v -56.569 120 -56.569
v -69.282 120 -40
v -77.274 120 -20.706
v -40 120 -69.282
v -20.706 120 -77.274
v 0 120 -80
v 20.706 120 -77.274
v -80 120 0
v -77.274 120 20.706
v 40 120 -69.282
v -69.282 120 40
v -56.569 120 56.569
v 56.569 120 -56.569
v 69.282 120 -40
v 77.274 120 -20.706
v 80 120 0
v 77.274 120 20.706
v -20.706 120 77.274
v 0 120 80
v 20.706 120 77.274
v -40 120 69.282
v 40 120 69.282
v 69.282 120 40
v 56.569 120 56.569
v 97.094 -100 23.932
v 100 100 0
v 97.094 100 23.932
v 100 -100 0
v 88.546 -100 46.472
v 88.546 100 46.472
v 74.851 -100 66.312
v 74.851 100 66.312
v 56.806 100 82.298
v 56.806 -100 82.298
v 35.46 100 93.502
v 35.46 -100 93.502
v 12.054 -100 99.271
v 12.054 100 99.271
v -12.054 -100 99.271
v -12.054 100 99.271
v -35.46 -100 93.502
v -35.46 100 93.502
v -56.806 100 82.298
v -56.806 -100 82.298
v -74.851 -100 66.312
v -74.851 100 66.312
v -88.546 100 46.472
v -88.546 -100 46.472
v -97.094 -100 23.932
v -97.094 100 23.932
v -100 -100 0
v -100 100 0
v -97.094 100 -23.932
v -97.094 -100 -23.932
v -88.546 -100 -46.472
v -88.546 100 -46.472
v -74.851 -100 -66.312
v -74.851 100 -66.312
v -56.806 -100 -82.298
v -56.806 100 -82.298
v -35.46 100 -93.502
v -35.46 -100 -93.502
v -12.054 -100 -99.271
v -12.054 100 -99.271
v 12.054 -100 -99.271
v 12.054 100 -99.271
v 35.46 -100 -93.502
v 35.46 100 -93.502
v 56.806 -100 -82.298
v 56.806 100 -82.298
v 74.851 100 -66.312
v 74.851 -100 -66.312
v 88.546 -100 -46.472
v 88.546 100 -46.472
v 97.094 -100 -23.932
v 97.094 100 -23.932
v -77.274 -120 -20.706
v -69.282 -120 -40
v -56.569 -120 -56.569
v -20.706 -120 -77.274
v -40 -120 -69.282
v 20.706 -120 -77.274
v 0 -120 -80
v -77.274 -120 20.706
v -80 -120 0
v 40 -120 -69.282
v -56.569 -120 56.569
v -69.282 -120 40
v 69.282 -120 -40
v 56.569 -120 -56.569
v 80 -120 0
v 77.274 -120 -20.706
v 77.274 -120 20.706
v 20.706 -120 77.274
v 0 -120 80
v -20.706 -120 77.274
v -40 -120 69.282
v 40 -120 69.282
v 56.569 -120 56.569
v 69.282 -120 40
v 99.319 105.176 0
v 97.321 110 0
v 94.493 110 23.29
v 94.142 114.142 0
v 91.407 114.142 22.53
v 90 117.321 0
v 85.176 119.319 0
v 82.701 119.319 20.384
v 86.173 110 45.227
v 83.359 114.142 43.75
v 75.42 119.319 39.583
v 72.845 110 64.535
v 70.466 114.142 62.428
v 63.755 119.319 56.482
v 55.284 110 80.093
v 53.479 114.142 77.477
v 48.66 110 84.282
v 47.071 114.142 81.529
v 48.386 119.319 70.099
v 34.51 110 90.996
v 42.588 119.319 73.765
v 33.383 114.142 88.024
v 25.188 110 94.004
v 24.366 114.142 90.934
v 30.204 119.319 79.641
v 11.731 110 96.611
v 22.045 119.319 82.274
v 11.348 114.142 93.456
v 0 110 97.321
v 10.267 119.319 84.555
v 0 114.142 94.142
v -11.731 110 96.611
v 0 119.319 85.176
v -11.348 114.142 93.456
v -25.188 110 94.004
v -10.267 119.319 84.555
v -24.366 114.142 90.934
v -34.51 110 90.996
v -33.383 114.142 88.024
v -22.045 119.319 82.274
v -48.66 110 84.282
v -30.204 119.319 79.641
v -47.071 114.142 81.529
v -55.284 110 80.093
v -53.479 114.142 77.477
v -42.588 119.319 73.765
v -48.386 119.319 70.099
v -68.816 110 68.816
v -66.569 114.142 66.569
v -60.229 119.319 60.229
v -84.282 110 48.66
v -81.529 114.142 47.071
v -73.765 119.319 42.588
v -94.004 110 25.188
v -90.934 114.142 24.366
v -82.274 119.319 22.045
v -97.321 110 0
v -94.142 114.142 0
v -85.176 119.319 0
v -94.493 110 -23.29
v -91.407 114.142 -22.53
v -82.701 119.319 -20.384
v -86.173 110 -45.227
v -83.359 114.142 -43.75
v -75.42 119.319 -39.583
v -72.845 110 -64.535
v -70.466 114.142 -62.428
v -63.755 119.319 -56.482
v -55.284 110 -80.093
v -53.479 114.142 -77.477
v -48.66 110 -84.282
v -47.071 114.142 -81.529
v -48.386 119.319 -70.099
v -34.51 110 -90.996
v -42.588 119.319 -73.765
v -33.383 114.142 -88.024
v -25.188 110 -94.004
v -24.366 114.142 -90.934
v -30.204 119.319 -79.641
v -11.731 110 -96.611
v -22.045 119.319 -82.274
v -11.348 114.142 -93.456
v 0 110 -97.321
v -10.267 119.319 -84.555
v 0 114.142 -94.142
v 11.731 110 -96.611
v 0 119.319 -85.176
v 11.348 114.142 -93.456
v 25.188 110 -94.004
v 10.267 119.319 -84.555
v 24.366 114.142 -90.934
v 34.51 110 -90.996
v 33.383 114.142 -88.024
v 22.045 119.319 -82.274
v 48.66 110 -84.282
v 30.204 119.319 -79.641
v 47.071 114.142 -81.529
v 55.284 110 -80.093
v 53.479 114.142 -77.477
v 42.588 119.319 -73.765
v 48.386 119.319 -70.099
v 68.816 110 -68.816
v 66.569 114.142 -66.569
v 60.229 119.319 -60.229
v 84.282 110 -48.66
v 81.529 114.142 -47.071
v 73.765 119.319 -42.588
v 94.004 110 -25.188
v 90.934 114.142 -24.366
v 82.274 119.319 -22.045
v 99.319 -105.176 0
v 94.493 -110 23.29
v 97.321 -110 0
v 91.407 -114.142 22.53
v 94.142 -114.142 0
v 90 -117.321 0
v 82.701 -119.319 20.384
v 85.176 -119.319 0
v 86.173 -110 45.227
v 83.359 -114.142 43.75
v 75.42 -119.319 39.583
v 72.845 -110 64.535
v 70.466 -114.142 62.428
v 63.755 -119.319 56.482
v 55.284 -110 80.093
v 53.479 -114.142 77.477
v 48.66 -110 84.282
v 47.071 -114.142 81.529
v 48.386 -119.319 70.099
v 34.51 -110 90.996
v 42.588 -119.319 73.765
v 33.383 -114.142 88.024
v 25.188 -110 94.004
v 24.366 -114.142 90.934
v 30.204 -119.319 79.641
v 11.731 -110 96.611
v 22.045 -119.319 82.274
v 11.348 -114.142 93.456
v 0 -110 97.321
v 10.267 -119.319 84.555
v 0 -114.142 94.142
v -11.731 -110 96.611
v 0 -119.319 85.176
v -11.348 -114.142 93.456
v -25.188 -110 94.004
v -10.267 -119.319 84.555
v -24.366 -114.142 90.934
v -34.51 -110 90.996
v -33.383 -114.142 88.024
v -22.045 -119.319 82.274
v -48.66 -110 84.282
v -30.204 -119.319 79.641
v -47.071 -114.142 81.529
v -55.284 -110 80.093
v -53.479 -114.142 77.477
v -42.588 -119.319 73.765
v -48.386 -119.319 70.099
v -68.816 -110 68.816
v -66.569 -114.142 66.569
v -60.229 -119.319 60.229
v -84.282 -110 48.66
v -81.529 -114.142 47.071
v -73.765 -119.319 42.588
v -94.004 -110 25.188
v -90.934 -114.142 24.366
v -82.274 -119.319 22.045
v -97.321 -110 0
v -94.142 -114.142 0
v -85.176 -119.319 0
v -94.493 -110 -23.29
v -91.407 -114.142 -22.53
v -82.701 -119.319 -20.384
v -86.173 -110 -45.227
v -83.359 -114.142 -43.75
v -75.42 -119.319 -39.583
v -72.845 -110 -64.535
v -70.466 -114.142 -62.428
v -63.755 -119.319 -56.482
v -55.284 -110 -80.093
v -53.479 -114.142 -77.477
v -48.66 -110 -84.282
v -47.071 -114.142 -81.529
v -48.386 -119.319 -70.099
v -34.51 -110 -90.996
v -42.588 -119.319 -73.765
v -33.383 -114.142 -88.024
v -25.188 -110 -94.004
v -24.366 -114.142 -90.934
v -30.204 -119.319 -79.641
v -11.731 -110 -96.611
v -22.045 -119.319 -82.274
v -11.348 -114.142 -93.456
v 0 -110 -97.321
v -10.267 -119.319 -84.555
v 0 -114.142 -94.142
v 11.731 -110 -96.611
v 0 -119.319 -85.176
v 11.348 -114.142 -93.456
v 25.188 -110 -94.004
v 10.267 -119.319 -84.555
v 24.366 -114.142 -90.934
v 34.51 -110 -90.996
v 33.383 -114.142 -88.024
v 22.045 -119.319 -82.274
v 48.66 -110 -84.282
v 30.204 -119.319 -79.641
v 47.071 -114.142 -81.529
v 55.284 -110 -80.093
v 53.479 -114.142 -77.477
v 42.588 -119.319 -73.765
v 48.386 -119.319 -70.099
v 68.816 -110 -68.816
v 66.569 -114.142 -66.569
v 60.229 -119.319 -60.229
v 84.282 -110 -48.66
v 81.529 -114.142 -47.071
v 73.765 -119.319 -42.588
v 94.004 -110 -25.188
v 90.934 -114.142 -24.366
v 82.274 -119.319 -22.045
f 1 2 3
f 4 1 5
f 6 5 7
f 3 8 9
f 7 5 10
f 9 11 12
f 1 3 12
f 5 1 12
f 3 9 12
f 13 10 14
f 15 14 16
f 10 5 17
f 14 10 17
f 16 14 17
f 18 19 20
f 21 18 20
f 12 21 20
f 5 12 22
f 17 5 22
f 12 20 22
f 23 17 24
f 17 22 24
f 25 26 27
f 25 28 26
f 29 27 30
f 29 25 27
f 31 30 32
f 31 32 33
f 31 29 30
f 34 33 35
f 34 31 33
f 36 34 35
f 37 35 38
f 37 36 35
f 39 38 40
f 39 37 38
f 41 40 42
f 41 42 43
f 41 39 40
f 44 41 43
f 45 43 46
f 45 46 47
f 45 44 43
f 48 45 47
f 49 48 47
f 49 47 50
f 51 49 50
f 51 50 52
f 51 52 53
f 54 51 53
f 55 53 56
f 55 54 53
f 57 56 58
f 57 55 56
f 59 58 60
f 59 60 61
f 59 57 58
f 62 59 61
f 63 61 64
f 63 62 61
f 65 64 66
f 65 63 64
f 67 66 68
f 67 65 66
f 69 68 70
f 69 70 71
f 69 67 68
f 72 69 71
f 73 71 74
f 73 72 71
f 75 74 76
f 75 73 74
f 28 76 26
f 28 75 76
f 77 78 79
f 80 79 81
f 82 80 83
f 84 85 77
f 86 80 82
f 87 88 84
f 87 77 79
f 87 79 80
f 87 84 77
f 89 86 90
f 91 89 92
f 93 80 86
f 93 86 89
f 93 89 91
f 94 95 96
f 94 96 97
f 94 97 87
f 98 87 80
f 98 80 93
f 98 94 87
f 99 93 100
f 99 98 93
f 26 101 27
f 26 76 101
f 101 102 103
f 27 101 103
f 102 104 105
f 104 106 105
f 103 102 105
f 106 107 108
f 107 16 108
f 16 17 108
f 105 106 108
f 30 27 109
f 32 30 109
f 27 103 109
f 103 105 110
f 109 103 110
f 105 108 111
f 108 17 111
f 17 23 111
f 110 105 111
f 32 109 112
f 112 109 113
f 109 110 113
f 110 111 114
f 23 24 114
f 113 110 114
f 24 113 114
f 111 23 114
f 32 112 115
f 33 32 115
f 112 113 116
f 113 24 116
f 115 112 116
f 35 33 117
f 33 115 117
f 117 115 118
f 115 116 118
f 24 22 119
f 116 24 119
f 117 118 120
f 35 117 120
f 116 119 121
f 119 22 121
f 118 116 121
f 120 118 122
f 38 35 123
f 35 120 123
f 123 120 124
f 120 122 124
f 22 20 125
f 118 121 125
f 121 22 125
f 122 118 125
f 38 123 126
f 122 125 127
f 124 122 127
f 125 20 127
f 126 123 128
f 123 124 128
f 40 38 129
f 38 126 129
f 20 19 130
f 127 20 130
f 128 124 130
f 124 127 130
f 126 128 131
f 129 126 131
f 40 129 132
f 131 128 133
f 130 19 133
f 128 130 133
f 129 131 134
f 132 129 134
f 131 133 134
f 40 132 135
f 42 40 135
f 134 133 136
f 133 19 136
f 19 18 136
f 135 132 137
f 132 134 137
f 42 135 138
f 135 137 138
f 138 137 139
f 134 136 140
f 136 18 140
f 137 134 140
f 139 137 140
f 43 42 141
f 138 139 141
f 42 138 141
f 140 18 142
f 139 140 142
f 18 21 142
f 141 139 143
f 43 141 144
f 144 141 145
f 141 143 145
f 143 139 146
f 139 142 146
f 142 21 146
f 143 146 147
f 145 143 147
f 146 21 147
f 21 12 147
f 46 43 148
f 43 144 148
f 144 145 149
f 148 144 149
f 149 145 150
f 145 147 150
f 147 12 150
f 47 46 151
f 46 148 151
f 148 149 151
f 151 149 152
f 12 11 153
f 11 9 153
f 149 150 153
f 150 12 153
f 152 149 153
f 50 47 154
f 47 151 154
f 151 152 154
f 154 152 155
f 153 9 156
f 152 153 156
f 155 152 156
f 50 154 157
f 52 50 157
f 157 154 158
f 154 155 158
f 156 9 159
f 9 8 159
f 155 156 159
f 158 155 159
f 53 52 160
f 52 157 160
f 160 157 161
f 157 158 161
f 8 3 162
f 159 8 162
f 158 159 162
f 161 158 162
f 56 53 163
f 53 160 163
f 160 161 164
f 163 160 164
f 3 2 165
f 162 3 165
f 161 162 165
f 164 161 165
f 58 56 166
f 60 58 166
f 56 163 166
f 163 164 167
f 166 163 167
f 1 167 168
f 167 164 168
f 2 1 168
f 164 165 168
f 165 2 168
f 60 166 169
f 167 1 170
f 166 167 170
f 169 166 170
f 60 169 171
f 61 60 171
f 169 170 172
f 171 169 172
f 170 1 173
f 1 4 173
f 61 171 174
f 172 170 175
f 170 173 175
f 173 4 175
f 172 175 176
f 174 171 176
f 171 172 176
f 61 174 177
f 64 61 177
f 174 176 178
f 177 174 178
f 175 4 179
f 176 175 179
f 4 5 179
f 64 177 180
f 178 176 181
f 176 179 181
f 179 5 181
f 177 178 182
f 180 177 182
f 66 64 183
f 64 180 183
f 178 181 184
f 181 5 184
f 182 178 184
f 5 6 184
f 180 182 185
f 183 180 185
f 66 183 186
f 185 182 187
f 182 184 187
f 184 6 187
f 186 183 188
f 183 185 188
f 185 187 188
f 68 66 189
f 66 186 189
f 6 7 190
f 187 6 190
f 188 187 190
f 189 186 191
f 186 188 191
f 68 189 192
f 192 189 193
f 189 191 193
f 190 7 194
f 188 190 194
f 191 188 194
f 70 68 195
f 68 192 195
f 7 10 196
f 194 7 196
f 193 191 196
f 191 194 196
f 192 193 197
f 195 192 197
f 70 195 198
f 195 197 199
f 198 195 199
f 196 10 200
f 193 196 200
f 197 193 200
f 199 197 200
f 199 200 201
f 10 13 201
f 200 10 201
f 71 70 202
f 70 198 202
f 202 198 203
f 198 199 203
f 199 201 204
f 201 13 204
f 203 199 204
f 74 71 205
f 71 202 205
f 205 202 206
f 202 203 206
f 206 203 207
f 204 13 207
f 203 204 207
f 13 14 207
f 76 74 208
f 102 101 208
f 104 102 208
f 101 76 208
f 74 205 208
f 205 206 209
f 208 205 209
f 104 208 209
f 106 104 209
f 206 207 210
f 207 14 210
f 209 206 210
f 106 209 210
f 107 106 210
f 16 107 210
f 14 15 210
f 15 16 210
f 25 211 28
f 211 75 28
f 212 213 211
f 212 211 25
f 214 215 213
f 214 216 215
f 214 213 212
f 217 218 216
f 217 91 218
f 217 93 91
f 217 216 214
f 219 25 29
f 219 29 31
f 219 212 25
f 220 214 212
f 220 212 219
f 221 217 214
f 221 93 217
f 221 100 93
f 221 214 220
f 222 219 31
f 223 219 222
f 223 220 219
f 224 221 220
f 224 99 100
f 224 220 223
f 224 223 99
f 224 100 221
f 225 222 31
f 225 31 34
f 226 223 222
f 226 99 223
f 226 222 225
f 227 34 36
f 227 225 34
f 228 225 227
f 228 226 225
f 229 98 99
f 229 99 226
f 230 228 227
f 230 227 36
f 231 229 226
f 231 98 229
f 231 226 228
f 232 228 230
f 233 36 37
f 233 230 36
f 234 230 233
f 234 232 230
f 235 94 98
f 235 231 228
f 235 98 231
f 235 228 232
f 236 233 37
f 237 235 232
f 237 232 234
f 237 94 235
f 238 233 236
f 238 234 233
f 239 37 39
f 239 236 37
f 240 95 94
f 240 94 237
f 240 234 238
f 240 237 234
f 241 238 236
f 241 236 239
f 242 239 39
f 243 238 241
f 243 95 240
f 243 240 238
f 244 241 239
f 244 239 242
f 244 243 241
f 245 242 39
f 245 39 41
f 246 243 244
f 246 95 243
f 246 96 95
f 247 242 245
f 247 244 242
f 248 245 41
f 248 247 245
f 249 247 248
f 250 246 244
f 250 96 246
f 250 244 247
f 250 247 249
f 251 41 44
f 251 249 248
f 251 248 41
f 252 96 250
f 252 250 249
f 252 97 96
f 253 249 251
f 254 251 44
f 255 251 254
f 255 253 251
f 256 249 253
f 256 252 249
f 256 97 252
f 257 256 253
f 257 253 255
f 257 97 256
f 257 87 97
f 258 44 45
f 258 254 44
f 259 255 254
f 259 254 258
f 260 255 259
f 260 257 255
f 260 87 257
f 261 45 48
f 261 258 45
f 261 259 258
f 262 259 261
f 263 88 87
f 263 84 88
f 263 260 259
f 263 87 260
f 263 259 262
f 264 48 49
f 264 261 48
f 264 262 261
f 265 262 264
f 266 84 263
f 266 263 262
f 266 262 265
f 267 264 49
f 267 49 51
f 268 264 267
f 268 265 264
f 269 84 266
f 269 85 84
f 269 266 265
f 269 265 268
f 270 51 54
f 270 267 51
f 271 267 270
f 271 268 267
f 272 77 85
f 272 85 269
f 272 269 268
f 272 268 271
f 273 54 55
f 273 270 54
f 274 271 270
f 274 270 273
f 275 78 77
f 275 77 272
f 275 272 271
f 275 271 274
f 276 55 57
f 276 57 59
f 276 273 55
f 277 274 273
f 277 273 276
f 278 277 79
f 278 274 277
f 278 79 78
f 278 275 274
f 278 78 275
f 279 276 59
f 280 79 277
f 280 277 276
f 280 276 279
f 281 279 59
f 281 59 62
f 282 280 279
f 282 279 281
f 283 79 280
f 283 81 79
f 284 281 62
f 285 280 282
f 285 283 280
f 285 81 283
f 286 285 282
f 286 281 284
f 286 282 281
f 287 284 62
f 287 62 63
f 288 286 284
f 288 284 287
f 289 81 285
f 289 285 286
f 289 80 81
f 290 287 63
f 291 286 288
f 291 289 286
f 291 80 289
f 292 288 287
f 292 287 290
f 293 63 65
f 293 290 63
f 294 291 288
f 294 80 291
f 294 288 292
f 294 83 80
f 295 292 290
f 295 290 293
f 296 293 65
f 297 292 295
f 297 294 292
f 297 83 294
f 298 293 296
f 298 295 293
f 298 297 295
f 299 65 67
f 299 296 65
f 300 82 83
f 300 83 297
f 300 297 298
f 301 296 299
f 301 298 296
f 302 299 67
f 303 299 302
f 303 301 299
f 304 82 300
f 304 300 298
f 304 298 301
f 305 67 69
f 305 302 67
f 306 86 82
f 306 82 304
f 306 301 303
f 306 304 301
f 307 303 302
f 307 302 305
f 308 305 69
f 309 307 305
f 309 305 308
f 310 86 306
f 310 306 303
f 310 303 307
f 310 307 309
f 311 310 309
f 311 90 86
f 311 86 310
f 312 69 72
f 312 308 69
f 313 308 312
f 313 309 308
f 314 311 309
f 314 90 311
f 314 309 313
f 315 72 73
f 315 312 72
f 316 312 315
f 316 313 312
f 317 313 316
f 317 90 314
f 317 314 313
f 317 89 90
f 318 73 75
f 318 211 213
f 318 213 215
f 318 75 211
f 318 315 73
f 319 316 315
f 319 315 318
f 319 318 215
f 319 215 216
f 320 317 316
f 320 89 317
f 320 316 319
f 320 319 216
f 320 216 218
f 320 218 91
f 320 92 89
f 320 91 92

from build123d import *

# Parameters (mm, degrees)
F0_R     = 100
F1_DEPTH = 120
F2_R     = 20


with BuildPart() as f1:
    # F0 (on Front) → F1 (new body)
    with BuildSketch(Plane.XZ):
        Circle(F0_R)
    extrude(amount=F1_DEPTH)

    # F2
    f2_edges = [f1.edges().sort_by_distance(p)[0] for p in [
        (-100, -120, 0),
    ]]
    fillet(f2_edges, radius=F2_R)

    # F3: F1 across face


with BuildPart() as f1_1:
    add(f1.part)
    add(f1.part.mirror(Plane(origin=(0, 0, 0), x_dir=(1, 0, 0), z_dir=(0, 1, 0))))


solid = f1_1.part
